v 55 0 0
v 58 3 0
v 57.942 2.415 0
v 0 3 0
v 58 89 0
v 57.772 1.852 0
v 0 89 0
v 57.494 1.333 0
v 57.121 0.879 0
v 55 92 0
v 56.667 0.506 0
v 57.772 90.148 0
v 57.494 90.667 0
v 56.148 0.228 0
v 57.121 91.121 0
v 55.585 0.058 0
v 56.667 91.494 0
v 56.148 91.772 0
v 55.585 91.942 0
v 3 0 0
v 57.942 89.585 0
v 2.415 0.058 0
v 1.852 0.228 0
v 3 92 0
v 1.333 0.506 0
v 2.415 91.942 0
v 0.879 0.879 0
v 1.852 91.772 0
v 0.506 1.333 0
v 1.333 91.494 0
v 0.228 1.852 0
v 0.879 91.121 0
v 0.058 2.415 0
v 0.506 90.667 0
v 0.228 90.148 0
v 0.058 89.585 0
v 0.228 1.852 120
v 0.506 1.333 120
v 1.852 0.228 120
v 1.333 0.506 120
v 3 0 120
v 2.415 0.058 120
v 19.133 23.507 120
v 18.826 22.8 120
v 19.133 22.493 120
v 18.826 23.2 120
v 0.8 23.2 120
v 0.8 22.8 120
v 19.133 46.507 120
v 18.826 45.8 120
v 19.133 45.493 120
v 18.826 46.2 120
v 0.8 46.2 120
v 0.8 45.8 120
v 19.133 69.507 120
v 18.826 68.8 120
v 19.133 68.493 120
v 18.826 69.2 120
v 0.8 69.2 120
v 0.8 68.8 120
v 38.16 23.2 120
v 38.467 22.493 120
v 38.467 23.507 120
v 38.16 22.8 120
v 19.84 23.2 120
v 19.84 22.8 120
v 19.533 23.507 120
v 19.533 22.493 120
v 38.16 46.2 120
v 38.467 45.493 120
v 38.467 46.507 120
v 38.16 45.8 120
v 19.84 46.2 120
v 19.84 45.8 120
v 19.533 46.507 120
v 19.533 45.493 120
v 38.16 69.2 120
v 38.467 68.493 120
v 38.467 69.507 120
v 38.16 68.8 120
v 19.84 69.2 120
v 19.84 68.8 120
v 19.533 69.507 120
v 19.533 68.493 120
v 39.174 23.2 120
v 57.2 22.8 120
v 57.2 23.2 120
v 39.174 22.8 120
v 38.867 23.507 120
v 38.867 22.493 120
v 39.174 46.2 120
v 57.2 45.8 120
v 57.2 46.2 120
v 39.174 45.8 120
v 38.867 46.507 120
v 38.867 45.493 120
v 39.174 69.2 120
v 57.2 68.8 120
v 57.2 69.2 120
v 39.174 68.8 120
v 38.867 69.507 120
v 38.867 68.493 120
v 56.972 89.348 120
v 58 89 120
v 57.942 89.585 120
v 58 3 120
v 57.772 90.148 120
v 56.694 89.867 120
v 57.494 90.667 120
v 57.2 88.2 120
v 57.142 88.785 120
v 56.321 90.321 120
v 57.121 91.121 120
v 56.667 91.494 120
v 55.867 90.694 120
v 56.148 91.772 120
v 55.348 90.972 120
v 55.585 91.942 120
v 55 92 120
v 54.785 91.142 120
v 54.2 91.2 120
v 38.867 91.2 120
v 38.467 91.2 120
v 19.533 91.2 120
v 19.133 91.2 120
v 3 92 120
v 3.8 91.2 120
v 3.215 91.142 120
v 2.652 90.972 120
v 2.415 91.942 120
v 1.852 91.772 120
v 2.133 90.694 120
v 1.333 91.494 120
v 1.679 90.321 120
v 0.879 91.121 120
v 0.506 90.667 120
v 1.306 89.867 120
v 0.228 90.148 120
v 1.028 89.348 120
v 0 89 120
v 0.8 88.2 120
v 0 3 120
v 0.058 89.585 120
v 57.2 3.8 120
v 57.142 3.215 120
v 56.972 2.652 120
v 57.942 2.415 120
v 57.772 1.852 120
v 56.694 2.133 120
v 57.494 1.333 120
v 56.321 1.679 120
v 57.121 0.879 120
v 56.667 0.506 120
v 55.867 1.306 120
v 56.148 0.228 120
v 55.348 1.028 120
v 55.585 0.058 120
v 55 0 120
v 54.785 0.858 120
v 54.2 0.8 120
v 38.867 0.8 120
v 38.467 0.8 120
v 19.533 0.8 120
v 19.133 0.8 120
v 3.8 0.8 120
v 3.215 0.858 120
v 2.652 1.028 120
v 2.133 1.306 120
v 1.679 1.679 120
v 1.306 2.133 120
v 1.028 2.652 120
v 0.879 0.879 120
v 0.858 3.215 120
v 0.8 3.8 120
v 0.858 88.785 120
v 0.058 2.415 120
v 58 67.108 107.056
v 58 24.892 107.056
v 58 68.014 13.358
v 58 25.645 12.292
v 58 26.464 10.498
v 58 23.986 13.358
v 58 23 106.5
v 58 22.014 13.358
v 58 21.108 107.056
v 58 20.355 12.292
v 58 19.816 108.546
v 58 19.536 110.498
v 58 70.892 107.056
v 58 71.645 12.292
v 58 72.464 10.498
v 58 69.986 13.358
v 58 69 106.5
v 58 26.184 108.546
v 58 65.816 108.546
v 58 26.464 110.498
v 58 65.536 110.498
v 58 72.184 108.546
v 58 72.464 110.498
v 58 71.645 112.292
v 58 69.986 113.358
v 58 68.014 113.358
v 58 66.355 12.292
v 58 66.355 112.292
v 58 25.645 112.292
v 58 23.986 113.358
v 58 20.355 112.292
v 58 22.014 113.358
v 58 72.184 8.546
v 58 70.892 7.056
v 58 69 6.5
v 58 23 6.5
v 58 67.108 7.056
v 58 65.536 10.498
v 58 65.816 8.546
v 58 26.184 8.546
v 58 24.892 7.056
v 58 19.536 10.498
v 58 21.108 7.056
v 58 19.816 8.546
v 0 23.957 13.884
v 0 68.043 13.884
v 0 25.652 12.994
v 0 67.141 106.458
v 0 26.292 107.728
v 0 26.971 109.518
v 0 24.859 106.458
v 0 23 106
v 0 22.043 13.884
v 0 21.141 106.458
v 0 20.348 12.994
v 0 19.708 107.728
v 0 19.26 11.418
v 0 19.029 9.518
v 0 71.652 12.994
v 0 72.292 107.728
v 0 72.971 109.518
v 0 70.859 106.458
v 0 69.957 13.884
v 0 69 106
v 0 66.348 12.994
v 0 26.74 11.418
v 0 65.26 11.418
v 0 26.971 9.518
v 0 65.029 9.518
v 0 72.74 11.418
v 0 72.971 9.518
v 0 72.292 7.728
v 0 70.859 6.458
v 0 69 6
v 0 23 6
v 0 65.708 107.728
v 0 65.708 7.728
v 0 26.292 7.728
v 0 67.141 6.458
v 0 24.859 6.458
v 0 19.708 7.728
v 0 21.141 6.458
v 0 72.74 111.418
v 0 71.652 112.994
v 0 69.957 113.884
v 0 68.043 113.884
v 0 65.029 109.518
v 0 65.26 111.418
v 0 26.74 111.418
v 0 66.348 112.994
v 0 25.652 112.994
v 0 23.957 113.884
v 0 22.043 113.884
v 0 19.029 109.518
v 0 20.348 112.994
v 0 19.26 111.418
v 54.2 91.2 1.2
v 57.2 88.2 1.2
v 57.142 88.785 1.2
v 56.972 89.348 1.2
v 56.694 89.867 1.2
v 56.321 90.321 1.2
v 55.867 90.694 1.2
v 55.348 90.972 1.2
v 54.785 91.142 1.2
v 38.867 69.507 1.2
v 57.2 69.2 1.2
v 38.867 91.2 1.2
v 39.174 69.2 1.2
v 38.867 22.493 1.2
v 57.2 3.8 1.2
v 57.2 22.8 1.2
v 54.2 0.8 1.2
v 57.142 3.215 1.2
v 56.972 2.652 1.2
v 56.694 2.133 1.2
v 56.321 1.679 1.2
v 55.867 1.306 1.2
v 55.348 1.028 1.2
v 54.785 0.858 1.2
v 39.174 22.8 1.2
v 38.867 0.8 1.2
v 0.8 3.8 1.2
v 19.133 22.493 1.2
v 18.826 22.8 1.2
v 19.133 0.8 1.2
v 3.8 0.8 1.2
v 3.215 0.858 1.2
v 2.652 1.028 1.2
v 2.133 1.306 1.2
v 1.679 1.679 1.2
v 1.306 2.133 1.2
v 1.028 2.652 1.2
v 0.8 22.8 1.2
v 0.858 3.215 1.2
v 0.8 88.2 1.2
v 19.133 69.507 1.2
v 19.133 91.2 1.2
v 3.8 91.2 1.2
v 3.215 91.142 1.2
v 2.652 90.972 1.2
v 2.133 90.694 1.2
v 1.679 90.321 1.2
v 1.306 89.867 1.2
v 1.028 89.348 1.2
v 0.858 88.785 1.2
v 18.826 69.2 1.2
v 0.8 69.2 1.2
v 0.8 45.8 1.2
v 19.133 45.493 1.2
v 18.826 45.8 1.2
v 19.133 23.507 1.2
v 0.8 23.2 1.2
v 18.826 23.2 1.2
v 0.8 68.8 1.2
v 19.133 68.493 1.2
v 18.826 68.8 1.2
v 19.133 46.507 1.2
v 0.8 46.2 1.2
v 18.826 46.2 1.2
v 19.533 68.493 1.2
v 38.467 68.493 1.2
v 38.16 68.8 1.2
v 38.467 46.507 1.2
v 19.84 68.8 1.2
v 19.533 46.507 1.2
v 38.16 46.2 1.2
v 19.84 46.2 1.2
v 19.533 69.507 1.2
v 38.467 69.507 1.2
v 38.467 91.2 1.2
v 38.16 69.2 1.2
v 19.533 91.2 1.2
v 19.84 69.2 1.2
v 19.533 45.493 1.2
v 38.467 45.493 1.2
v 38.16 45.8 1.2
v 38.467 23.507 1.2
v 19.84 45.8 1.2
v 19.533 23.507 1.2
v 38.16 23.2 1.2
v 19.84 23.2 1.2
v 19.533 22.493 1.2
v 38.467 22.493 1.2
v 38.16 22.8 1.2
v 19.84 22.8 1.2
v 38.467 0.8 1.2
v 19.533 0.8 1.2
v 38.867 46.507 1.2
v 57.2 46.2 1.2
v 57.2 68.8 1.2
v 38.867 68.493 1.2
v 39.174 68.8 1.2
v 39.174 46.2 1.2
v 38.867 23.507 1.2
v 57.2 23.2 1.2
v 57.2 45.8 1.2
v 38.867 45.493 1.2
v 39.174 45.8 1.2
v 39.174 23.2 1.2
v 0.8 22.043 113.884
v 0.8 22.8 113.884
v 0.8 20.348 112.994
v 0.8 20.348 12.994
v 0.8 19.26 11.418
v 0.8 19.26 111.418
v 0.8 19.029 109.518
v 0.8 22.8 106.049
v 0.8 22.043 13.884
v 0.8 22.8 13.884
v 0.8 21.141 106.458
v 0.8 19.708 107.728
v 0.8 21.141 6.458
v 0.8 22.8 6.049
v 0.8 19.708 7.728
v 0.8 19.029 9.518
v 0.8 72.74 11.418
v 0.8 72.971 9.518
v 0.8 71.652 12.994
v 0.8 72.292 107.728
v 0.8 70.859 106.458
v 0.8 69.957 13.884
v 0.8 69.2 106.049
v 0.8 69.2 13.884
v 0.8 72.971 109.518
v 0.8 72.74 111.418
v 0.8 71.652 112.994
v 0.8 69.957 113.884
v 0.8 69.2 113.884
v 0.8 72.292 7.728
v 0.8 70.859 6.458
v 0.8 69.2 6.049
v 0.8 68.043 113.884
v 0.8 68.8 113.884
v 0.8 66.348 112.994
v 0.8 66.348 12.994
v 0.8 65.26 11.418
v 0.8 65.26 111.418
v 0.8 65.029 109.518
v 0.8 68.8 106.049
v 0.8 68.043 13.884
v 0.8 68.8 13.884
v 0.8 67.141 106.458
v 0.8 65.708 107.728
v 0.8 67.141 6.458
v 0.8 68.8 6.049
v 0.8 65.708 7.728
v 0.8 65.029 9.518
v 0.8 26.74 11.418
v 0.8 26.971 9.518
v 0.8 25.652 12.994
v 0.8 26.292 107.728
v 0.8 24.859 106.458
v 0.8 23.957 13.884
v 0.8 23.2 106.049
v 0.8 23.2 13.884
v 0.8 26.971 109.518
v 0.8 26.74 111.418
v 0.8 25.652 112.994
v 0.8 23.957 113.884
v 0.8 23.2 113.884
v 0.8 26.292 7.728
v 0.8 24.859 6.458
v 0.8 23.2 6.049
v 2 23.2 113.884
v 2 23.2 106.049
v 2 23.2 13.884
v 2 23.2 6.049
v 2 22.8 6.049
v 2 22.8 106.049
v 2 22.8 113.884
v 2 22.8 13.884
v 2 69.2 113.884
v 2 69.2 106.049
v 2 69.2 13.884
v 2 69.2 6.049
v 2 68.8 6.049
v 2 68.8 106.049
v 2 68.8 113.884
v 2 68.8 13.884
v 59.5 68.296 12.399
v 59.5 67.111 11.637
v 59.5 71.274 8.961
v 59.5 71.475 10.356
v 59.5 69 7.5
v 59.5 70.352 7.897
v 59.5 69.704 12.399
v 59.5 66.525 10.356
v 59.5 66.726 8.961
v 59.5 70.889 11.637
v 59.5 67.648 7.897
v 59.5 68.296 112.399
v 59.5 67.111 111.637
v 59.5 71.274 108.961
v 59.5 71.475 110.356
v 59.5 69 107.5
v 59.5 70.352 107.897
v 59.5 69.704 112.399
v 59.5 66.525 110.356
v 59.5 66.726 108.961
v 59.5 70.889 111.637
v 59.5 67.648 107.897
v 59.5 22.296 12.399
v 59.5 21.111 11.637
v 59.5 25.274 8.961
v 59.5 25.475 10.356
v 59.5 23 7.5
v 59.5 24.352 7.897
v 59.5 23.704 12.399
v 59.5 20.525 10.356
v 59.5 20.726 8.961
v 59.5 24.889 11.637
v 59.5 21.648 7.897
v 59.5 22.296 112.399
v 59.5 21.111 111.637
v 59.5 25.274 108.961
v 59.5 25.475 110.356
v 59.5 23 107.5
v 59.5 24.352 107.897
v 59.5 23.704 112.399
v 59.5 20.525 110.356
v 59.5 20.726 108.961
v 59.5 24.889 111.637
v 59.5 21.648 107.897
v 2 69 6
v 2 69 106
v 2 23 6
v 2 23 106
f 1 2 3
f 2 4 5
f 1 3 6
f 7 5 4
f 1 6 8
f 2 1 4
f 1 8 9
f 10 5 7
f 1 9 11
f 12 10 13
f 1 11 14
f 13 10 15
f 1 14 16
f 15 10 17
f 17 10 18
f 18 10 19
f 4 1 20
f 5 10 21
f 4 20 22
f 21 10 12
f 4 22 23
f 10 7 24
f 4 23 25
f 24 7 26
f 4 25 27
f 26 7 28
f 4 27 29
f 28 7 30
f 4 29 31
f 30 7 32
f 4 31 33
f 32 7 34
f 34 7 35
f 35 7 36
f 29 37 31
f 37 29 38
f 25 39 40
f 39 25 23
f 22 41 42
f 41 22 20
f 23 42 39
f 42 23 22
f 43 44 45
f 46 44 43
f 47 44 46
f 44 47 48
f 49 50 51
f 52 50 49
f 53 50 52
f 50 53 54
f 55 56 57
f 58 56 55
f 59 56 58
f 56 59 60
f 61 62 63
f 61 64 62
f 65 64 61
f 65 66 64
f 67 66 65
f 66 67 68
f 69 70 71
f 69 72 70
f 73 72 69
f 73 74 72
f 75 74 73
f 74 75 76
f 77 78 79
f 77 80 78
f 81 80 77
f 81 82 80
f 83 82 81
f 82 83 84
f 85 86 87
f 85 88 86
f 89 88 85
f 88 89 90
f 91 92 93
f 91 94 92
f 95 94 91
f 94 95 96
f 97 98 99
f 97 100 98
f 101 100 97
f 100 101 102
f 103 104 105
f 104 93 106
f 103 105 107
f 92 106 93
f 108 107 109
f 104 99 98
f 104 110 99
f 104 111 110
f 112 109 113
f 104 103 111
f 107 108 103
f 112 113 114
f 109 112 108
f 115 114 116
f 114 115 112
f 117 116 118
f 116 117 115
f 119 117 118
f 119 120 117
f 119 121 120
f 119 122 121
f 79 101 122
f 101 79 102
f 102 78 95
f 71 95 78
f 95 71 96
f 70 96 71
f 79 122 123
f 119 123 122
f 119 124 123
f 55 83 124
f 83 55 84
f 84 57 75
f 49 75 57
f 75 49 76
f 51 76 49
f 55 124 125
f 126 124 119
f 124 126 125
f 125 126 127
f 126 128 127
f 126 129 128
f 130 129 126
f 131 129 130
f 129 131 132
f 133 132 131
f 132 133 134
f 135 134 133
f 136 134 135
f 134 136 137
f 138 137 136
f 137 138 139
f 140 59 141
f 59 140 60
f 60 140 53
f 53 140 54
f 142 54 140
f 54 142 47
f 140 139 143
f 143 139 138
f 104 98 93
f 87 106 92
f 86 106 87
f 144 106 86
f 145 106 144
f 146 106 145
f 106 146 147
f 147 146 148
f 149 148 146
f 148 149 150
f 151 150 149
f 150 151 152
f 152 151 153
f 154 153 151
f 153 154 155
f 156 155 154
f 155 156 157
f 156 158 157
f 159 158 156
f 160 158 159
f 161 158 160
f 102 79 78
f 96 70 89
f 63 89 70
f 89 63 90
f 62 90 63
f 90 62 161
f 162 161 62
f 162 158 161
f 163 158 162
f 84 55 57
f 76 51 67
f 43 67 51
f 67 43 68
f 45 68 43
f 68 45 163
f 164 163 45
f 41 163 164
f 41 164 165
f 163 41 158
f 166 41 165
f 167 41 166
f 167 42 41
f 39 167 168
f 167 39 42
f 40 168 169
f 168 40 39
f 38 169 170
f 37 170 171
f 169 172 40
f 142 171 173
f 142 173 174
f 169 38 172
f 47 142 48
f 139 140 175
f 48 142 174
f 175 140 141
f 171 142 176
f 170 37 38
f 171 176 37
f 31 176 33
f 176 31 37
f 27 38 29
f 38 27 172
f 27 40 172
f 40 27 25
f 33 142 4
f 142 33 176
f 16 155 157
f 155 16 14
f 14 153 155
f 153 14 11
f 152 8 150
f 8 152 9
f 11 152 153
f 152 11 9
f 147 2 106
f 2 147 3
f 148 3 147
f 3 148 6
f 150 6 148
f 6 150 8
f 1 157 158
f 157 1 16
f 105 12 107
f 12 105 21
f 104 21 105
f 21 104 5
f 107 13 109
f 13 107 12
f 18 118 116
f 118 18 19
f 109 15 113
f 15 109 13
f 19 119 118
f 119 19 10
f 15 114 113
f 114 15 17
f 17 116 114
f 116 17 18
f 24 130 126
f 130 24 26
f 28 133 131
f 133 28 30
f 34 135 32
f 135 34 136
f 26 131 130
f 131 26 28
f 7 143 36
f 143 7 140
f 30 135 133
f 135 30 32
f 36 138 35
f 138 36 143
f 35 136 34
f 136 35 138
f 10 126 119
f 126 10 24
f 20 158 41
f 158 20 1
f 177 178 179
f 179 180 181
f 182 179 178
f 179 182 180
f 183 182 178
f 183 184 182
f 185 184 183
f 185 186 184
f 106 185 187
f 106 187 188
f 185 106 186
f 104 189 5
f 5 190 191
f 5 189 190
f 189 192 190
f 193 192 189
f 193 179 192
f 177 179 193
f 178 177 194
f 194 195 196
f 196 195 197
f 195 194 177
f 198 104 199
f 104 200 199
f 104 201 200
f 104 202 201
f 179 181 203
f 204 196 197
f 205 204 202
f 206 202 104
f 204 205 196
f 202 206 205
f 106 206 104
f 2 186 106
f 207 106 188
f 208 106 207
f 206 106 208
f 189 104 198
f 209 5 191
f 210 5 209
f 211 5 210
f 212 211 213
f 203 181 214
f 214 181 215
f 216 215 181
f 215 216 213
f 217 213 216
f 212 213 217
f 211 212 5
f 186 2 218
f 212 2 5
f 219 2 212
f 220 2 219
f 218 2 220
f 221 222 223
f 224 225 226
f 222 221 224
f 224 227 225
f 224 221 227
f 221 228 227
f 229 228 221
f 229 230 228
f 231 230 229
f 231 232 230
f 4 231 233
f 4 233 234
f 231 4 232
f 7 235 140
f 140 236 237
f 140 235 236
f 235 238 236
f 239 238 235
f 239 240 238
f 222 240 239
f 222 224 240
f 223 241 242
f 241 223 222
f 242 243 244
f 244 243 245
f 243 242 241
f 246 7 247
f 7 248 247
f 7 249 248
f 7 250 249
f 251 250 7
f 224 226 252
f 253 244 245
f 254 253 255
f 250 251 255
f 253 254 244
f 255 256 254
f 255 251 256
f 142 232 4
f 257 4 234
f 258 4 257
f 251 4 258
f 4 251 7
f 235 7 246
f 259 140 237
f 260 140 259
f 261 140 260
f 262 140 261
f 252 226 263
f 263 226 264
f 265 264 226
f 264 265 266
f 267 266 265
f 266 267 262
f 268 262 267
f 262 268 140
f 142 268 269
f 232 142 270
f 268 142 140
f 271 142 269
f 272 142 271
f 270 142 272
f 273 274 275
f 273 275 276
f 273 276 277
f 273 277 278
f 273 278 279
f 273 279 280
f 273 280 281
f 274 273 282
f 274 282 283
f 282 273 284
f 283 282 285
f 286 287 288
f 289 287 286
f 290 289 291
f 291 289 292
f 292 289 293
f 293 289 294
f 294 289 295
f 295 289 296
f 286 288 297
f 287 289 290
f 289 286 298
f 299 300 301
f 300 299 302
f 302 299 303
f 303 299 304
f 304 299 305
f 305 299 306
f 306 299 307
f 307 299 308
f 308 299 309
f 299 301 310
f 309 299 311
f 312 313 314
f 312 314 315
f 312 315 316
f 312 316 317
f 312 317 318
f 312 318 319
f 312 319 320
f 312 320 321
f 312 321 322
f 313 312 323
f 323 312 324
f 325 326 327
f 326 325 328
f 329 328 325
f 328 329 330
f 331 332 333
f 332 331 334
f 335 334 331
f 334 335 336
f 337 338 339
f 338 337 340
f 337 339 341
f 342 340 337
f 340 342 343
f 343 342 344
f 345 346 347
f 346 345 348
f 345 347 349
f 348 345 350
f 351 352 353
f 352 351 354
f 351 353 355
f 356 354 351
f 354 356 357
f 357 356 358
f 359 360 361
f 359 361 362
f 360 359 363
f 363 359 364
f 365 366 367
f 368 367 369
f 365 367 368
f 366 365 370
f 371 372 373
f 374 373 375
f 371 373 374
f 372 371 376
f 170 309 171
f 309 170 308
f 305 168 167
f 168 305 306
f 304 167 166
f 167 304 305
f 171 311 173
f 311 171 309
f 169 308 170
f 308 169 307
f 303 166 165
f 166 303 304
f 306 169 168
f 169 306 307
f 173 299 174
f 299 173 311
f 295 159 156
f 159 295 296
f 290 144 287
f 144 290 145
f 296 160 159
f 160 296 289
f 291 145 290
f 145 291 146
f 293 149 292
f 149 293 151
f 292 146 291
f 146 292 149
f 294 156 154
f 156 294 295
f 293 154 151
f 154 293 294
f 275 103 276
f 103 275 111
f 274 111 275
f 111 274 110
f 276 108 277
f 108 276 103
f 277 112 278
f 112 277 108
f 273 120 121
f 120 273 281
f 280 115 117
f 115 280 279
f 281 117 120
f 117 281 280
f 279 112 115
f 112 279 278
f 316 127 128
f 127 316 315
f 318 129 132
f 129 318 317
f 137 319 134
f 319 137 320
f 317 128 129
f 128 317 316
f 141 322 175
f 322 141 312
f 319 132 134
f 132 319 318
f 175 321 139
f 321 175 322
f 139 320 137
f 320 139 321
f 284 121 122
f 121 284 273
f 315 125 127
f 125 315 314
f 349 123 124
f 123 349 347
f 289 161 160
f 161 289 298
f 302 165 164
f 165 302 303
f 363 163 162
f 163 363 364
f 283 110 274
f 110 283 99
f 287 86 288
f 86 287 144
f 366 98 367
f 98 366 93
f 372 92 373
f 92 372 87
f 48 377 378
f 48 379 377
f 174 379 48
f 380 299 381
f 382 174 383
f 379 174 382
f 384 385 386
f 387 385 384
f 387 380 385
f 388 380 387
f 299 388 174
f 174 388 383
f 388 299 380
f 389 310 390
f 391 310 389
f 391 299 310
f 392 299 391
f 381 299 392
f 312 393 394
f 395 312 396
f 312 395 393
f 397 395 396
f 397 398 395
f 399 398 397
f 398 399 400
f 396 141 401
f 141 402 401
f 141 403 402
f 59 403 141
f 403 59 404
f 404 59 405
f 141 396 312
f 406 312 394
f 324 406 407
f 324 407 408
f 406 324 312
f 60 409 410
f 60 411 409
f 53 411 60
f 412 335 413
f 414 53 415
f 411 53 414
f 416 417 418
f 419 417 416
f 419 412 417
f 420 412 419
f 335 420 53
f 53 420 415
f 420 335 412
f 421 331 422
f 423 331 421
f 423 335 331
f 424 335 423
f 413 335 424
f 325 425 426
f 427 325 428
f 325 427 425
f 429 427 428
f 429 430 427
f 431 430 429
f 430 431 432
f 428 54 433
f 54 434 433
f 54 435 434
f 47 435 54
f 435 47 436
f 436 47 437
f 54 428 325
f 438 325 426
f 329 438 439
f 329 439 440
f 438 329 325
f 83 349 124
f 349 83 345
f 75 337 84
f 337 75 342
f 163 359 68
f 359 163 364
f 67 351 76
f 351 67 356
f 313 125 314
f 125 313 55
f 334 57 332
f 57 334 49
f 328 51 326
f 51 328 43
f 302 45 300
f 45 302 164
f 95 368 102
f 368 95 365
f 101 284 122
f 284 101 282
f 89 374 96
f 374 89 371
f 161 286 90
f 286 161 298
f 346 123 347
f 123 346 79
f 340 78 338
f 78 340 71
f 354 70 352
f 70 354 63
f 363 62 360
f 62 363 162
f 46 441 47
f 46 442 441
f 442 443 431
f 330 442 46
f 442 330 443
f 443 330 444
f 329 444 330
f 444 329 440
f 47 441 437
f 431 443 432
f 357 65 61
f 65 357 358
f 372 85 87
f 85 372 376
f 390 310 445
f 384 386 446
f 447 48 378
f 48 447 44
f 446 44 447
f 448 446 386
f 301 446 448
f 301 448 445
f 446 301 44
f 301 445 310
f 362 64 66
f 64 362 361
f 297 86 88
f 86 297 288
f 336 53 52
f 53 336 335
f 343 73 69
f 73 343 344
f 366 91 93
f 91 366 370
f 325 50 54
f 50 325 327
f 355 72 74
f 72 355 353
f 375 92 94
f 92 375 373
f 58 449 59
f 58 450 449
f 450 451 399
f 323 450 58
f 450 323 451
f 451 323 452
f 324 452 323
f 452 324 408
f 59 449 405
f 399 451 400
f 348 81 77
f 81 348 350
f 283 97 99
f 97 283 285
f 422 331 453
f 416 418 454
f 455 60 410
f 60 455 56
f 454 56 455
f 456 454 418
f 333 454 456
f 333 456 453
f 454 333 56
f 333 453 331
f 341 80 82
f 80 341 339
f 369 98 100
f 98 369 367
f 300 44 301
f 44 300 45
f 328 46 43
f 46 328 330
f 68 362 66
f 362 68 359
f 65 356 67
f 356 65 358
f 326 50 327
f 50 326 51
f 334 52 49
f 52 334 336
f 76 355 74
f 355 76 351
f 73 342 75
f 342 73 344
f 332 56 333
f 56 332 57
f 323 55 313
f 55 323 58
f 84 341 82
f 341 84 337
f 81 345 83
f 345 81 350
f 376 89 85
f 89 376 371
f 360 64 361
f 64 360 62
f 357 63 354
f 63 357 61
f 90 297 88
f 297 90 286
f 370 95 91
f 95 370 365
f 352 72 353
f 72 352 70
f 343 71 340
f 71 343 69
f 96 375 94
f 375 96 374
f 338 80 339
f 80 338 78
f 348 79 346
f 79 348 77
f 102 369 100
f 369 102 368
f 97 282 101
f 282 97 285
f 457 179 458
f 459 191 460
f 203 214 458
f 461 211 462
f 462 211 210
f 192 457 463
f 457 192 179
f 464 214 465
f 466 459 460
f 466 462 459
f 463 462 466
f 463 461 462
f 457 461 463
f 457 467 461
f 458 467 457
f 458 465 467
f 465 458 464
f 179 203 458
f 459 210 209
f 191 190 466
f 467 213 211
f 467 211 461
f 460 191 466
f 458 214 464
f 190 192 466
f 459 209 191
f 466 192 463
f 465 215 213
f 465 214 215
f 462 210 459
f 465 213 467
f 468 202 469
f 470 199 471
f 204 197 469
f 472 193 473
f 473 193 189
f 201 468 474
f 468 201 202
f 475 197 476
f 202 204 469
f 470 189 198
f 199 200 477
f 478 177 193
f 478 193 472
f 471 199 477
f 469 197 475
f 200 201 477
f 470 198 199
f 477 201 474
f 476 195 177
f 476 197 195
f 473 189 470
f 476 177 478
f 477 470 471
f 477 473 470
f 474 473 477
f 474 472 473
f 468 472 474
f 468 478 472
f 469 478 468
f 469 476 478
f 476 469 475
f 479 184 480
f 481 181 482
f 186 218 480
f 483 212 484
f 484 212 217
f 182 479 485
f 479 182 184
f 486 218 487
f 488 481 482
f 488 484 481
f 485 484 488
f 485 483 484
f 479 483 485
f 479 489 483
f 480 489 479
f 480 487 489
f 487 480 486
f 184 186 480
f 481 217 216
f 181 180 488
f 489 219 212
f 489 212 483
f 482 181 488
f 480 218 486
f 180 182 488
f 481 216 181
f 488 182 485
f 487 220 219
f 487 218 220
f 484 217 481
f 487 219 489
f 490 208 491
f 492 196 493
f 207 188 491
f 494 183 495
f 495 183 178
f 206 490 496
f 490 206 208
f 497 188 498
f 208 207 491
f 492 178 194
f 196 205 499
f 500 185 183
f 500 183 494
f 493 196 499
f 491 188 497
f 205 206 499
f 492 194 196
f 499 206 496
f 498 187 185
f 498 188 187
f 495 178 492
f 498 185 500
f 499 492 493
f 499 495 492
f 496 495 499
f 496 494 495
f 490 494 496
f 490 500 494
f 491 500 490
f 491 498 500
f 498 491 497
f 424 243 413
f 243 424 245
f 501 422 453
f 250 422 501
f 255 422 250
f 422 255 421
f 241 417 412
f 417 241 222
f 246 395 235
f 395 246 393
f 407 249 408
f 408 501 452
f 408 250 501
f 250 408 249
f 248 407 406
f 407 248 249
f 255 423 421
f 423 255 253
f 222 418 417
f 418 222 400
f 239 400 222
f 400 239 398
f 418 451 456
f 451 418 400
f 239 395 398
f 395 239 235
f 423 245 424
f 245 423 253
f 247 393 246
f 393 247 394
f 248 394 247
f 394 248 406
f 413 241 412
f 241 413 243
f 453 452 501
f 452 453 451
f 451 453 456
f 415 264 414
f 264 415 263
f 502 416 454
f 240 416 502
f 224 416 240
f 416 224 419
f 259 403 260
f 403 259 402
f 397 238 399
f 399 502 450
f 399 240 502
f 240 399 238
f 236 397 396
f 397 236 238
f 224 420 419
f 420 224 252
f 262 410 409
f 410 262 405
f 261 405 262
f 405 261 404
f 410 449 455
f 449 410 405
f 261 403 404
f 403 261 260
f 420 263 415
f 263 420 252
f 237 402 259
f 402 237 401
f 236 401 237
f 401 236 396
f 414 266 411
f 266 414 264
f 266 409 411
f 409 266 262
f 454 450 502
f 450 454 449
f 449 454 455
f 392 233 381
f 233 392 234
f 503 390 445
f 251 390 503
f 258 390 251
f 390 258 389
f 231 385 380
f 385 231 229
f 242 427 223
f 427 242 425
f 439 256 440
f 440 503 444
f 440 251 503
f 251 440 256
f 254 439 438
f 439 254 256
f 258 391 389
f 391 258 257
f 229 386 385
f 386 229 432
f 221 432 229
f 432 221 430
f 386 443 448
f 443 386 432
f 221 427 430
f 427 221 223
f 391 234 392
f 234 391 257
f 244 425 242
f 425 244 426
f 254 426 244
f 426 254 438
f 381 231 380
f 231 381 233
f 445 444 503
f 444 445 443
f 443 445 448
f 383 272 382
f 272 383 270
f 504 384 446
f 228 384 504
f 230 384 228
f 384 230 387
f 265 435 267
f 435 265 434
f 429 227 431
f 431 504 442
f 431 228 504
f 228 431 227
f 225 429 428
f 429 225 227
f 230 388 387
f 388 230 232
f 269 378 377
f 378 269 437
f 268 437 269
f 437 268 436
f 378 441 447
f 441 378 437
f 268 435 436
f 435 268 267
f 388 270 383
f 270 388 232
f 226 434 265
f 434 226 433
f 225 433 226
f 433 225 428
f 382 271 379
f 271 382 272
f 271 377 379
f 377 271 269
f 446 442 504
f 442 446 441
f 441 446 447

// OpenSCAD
module rounded_cube(size,r) {
    union()
    {
        height = size[2];
        echo(height);
        translate([r,r,0])
            cylinder(h=height, r=r, $fn=32);
        translate([size[0]-r,r,0])
            cylinder(h=height, r=r, $fn=32);
        translate([size[0]-r,size[1]-r,0])
            cylinder(h=height, r=r, $fn=32);
        translate([r,size[1]-r,0])
            cylinder(h=height, r=r, $fn=32);
        translate([r,0,0])
            cube([size[0]-2*r, size[1], size[2]]);
        translate([0,r,0])
            cube([size[0], size[1]-2*r, size[2]]);
    }
}
module box() {
    union() {
        w=58;
        d=92;
        h=120;
        th = 0.4; //thickness inside
        th2 = 0.8; //thickness outside
        
        difference() {
            rounded_cube([w,d,h],3);
            translate([th2,th2,1.2])
                rounded_cube([w-2*th2,d-2*th2,h],3);
        }
        dw = w/3;
        for(i=[dw:dw:w-th]) {
            translate([i-th/2,0,0])
                cube([th,d,h]);
        }
        dd = d/4;
        for(i=[dd:dd:d-th]) {
            translate([0,i-th/2,0])
                cube([w,th,h]);
        }
        
        for(j=[dw:dw:w-th]) {
            for(k=[dd:dd:d-th]) {
                translate([j,k,h/2])
                    rotate([0,0,45])
                        cube([th*2.5,th*2.5,h],center=true);
            }
        }
        for( y = [92/2 + 46/2, 92/2 - 46/2]) {
            for( z = [10,110]) {
                translate([w,y,z]) rotate([0,90,0])
                    cylinder(h=1.5, d1=7, d2 = 5);
            }
        }
    }
}

difference() {
    box();
    for( y = [92/2 + 46/2, 92/2 - 46/2]) {
        for( z = [10,110]) {
            translate([0,y,z]) rotate([0,90,0])
                cylinder(h=4, d=8, center=true);
        }
    }
}      
